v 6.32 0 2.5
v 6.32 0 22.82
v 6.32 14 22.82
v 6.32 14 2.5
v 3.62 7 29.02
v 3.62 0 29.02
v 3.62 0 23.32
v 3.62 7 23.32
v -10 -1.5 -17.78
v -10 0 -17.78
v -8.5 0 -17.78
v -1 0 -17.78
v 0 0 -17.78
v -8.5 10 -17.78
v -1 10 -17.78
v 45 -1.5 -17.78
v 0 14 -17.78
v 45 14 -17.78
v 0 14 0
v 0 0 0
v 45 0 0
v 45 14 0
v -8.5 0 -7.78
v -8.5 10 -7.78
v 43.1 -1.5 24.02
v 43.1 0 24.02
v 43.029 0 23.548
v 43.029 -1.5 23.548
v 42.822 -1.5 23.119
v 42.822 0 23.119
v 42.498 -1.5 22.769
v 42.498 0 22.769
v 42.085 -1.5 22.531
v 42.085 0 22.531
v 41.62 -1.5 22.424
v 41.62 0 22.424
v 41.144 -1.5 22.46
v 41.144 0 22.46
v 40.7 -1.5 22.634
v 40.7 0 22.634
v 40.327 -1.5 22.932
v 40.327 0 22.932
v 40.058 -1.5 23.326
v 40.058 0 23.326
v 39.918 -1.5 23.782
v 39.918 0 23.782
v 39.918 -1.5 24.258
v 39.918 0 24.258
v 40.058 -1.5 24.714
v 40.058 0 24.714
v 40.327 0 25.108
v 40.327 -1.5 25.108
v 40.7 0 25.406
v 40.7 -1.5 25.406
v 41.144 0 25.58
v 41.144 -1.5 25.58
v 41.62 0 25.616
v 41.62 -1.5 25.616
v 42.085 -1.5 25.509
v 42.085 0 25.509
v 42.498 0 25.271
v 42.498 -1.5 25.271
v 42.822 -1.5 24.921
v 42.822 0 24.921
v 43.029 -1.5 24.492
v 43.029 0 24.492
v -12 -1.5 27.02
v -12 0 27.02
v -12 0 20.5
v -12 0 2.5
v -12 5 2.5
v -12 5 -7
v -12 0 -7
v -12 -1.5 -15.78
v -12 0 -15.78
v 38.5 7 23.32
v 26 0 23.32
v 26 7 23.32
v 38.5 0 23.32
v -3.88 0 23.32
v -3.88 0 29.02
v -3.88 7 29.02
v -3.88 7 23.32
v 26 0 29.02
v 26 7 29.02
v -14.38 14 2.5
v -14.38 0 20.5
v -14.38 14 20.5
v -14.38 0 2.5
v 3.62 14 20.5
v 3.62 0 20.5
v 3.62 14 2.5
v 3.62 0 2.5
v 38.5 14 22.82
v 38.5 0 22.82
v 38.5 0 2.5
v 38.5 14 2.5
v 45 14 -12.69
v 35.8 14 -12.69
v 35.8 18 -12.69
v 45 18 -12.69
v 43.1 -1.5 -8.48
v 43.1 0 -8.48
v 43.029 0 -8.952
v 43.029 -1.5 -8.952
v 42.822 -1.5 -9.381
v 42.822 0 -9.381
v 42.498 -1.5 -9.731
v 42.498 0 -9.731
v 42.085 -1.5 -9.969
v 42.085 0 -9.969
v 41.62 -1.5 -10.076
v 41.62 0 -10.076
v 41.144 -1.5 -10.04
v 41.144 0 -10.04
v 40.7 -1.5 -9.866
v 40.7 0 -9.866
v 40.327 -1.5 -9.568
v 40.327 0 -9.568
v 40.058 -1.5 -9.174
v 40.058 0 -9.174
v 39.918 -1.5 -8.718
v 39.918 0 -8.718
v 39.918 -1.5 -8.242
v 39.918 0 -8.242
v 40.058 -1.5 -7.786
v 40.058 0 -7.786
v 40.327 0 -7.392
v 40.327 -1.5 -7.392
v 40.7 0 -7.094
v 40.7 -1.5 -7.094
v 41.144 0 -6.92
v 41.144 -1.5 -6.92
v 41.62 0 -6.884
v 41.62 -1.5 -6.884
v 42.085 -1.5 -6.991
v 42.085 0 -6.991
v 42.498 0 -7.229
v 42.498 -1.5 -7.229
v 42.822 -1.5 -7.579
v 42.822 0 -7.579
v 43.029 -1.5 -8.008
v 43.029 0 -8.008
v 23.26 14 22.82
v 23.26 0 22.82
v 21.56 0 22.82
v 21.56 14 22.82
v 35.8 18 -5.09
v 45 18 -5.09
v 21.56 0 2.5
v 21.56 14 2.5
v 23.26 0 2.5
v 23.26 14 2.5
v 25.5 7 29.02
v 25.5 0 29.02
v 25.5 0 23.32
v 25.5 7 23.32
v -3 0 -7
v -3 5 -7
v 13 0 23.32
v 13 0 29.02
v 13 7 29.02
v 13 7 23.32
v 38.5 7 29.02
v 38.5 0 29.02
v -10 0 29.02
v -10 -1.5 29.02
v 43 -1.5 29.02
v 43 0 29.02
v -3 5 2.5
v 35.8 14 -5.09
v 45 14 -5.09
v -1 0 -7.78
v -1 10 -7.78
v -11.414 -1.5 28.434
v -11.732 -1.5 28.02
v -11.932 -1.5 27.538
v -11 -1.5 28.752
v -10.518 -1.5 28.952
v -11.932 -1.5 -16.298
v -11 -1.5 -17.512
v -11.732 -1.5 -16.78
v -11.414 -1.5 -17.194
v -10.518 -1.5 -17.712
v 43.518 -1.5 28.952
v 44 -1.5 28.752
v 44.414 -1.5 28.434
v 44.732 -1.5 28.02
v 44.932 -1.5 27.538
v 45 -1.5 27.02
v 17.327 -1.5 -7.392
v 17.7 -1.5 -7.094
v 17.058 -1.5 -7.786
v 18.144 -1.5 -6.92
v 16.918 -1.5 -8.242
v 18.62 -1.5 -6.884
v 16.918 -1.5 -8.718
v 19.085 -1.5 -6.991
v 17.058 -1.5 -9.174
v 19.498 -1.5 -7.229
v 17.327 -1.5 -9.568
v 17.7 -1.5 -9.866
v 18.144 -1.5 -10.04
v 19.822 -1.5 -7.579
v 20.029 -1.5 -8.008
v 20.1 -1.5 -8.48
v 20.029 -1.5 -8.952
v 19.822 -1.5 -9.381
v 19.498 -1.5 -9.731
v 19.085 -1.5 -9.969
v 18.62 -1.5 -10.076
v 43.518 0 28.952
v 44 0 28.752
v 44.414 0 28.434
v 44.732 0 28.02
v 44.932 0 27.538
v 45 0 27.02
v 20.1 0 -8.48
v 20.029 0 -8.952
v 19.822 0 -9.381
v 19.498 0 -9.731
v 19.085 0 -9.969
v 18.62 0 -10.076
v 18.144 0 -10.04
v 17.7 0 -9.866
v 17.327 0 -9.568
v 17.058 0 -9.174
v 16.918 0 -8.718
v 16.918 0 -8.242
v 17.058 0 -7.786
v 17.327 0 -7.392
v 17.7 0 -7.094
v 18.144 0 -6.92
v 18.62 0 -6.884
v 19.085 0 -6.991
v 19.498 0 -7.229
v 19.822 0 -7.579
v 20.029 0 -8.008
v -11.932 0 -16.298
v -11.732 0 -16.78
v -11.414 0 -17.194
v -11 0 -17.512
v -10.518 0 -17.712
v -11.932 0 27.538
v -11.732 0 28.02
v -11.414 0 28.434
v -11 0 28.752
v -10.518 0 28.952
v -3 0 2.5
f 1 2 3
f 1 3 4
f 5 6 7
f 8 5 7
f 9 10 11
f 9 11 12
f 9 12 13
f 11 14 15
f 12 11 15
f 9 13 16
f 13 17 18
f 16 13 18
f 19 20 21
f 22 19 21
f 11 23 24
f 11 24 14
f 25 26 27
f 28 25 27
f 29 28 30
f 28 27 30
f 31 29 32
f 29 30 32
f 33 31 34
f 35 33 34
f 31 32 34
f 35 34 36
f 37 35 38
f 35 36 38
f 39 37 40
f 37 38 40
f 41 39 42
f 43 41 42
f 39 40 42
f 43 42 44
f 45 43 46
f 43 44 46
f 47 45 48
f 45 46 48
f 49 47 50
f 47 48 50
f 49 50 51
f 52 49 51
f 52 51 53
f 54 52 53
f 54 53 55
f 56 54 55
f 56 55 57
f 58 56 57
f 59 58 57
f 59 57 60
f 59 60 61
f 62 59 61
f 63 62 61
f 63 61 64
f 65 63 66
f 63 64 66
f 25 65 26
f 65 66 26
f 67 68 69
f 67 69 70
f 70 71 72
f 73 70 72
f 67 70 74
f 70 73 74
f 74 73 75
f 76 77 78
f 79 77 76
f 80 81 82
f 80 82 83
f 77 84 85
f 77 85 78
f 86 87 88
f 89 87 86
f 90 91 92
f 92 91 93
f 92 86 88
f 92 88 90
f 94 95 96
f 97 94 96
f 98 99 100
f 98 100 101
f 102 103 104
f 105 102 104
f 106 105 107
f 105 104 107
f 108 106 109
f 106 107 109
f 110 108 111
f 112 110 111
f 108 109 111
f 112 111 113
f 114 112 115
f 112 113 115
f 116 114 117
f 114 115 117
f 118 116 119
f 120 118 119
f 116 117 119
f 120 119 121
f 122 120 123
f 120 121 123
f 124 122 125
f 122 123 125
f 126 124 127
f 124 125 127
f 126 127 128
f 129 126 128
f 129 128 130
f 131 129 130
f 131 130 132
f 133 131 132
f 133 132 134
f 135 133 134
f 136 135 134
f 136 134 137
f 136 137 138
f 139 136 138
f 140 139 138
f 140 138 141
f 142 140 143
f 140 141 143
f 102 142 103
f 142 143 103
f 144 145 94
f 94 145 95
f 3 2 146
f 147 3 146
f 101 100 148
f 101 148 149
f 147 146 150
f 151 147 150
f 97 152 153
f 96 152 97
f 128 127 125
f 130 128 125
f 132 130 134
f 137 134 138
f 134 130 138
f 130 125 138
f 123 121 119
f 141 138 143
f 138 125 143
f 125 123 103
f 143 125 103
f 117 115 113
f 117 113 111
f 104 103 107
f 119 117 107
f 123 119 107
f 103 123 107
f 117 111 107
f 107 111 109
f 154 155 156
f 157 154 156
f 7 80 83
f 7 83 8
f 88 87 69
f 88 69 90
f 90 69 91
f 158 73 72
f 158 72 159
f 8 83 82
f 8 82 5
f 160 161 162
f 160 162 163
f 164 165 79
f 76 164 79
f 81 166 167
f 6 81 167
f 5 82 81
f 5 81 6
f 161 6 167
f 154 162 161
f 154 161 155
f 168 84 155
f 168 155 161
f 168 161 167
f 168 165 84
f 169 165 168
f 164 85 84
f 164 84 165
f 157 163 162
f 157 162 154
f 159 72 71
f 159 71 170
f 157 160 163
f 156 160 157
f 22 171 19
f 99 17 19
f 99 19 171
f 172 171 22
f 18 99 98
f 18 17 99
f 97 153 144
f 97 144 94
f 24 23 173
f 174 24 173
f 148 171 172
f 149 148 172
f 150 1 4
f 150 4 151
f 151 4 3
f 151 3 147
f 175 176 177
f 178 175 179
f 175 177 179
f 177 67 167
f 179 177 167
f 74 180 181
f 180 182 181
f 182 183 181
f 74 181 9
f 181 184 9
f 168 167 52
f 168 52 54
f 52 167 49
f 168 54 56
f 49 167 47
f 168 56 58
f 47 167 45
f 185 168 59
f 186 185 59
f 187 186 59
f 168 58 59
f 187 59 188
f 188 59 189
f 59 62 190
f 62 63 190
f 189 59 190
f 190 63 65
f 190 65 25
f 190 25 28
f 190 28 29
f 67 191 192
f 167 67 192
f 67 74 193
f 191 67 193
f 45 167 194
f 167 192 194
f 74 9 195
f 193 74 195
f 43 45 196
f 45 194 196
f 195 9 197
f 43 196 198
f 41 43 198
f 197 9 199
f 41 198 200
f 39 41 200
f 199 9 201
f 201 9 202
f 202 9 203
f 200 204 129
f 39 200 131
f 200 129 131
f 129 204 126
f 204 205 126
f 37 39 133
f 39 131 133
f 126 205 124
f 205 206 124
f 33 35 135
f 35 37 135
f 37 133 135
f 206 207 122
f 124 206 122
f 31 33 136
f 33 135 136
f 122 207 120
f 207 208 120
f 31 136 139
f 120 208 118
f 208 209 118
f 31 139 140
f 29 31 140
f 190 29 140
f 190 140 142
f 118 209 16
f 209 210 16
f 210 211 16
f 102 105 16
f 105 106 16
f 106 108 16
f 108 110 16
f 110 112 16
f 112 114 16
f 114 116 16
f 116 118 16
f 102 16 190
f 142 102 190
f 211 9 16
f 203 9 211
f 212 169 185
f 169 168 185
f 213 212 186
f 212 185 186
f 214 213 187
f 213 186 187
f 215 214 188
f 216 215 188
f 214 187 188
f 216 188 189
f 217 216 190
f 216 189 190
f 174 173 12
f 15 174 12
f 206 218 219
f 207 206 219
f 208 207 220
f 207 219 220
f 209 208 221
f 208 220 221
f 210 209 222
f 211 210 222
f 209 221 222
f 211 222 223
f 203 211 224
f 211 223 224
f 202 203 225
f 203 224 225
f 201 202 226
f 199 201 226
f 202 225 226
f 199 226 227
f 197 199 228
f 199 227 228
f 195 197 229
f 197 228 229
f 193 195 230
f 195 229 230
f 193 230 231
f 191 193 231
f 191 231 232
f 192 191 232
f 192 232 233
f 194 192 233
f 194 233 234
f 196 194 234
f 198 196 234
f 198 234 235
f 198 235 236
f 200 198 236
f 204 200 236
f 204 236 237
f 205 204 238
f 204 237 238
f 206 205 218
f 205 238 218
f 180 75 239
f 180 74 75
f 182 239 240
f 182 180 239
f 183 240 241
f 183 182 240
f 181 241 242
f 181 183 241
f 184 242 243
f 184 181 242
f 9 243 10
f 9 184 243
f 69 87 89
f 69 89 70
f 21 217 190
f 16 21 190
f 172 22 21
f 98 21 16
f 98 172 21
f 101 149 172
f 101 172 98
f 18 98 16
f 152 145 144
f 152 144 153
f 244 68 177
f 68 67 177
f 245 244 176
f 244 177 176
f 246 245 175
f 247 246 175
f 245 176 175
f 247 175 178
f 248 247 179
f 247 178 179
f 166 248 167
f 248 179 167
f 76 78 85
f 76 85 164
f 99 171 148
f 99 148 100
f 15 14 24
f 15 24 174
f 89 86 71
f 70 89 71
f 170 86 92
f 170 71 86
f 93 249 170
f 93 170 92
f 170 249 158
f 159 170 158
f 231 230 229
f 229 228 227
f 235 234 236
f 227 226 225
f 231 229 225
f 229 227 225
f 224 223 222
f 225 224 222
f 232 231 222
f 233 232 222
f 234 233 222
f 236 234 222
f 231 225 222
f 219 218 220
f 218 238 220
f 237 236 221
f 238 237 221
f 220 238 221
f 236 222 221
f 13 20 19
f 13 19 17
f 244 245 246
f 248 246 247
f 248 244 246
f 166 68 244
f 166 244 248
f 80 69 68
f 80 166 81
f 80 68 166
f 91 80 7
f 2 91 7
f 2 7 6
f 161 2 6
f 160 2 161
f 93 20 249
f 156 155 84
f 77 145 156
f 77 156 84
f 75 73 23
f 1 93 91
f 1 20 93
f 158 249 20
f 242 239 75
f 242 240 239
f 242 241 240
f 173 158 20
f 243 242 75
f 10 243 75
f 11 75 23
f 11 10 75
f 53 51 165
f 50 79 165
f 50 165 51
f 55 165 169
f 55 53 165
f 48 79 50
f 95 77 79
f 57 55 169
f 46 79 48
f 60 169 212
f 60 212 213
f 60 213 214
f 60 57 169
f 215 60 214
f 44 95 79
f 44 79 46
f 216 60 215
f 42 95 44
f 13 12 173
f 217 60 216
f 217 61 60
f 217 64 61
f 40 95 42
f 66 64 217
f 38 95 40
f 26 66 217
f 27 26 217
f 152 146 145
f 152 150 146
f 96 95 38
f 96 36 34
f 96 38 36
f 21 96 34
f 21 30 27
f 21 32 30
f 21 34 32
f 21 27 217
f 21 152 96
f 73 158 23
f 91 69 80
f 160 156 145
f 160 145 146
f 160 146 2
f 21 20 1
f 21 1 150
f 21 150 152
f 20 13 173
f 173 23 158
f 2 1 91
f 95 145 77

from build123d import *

# Parameters (mm, degrees)
SKETCH1_W             = 45
SKETCH1_H             = 17.78
BOSS_EXTRUDE1_DEPTH   = 14
SKETCH1_W_2           = 15.24
SKETCH1_H_2           = 20.32
BOSS_EXTRUDE1_2_DEPTH = 14
BOSS_EXTRUDE1_3_DEPTH = 14
SKETCH1_W_3           = 18
SKETCH1_H_3           = 18
BOSS_EXTRUDE1_4_DEPTH = 14
SKETCH2_W             = 12.5
SKETCH2_H             = 5.7
BOSS_EXTRUDE2_DEPTH   = 7
BOSS_EXTRUDE2_2_DEPTH = 7
SKETCH2_W_2           = 7.5
BOSS_EXTRUDE2_3_DEPTH = 7
SKETCH4_W             = 9
SKETCH4_H             = 27.5
BOSS_EXTRUDE4_DEPTH   = 5
SKETCH5_W             = 7.5
SKETCH5_H             = 10
BOSS_EXTRUDE5_DEPTH   = 10
SKETCH3_W             = 57
SKETCH3_H             = 46.8
SKETCH3_R             = 1.6
BOSS_EXTRUDE3_DEPTH   = 1.5
SKETCH6_W             = 9.2
SKETCH6_H             = 7.6
BOSS_EXTRUDE6_DEPTH   = 4
FILLET1_R             = 2


with BuildPart() as part:
    # Sketch1 → Boss-Extrude1 (new body)
    with BuildSketch(Plane(origin=(0, 0, 0), x_dir=(1, 0, 0), z_dir=(0, 1, 0))):
        with Locations((22.5, 8.89)):
            Rectangle(SKETCH1_W, SKETCH1_H)
    extrude(amount=BOSS_EXTRUDE1_DEPTH)



with BuildPart() as body_2:
    # Sketch1 → Boss-Extrude1 2 (new body)
    with BuildSketch(Plane(origin=(0, 0, 0), x_dir=(1, 0, 0), z_dir=(0, 1, 0))):
        with Locations((30.88, -12.66)):
            Rectangle(SKETCH1_W_2, SKETCH1_H_2)
    extrude(amount=BOSS_EXTRUDE1_2_DEPTH)


with BuildPart() as body_3:
    # Sketch1 → Boss-Extrude1 3 (new body)
    with BuildSketch(Plane(origin=(0, 0, 0), x_dir=(1, 0, 0), z_dir=(0, 1, 0))):
        with Locations((13.94, -12.66)):
            Rectangle(SKETCH1_W_2, SKETCH1_H_2)
    extrude(amount=BOSS_EXTRUDE1_3_DEPTH)


with BuildPart() as body_4:
    # Sketch1 → Boss-Extrude1 4 (new body)
    with BuildSketch(Plane(origin=(0, 0, 0), x_dir=(1, 0, 0), z_dir=(0, 1, 0))):
        with Locations((-5.38, -11.5)):
            Rectangle(SKETCH1_W_3, SKETCH1_H_3)
    extrude(amount=BOSS_EXTRUDE1_4_DEPTH)


with BuildPart() as body_5:
    # Sketch2 → Boss-Extrude2 (new body)
    with BuildSketch(Plane(origin=(0, 0, 0), x_dir=(1, 0, 0), z_dir=(0, 1, 0))):
        with Locations((32.25, -26.17)):
            Rectangle(SKETCH2_W, SKETCH2_H)
    extrude(amount=BOSS_EXTRUDE2_DEPTH)


with BuildPart() as body_6:
    # Sketch2 → Boss-Extrude2 2 (new body)
    with BuildSketch(Plane(origin=(0, 0, 0), x_dir=(1, 0, 0), z_dir=(0, 1, 0))):
        with Locations((19.25, -26.17)):
            Rectangle(SKETCH2_W, SKETCH2_H)
    extrude(amount=BOSS_EXTRUDE2_2_DEPTH)


with BuildPart() as body_7:
    # Sketch2 → Boss-Extrude2 3 (new body)
    with BuildSketch(Plane(origin=(0, 0, 0), x_dir=(1, 0, 0), z_dir=(0, 1, 0))):
        with Locations((-0.13, -26.17)):
            Rectangle(SKETCH2_W_2, SKETCH2_H)
    extrude(amount=BOSS_EXTRUDE2_3_DEPTH)


with BuildPart() as body_8:
    # Sketch4 → Boss-Extrude4 (new body)
    with BuildSketch(Plane(origin=(0, 0, 0), x_dir=(1, 0, 0), z_dir=(0, 1, 0))):
        with Locations((-7.5, -6.75)):
            Rectangle(SKETCH4_W, SKETCH4_H)
    extrude(amount=BOSS_EXTRUDE4_DEPTH)


with BuildPart() as body_9:
    # Sketch5 → Boss-Extrude5 (new body)
    with BuildSketch(Plane(origin=(0, 0, 0), x_dir=(1, 0, 0), z_dir=(0, 1, 0))):
        with Locations((-4.75, 12.78)):
            Rectangle(SKETCH5_W, SKETCH5_H)
    extrude(amount=BOSS_EXTRUDE5_DEPTH)


with BuildPart() as part_1:
    add(part.part)

    add(body_2.part)  # Boss-Extrude3 merges body 2

    add(body_3.part)  # Boss-Extrude3 merges body 3

    add(body_4.part)  # Boss-Extrude3 merges body 4

    add(body_5.part)  # Boss-Extrude3 merges body 5

    add(body_6.part)  # Boss-Extrude3 merges body 6

    add(body_7.part)  # Boss-Extrude3 merges body 7

    add(body_8.part)  # Boss-Extrude3 merges body 8

    add(body_9.part)  # Boss-Extrude3 merges body 9
    # Sketch3 → Boss-Extrude3 (add)
    with BuildSketch(Plane(origin=(0, 0, 0), x_dir=(1, 0, 0), z_dir=(0, 1, 0))):
        with Locations((16.5, -5.62)):
            Rectangle(SKETCH3_W, SKETCH3_H)
        with Locations((41.5, -24.02)):
            Circle(SKETCH3_R, mode=Mode.SUBTRACT)
        with Locations((41.5, 8.48)):
            Circle(SKETCH3_R, mode=Mode.SUBTRACT)
        with Locations((18.5, 8.48)):
            Circle(SKETCH3_R, mode=Mode.SUBTRACT)
    extrude(amount=-BOSS_EXTRUDE3_DEPTH)

    # Sketch6 → Boss-Extrude6 (add)
    with BuildSketch(Plane(origin=(0, 14, 0), x_dir=(1, 0, 0), z_dir=(0, 1, 0))):
        with Locations((40.4, 8.89)):
            Rectangle(SKETCH6_W, SKETCH6_H)
    extrude(amount=BOSS_EXTRUDE6_DEPTH)

    # Fillet1
    fillet1_edges = [part_1.edges().sort_by_distance(p)[0] for p in [
        (45, -0.75, 29.02),
        (-12, -0.75, 29.02),
        (-12, -0.75, -17.78),
    ]]
    fillet(fillet1_edges, radius=FILLET1_R)


solid = part_1.part
